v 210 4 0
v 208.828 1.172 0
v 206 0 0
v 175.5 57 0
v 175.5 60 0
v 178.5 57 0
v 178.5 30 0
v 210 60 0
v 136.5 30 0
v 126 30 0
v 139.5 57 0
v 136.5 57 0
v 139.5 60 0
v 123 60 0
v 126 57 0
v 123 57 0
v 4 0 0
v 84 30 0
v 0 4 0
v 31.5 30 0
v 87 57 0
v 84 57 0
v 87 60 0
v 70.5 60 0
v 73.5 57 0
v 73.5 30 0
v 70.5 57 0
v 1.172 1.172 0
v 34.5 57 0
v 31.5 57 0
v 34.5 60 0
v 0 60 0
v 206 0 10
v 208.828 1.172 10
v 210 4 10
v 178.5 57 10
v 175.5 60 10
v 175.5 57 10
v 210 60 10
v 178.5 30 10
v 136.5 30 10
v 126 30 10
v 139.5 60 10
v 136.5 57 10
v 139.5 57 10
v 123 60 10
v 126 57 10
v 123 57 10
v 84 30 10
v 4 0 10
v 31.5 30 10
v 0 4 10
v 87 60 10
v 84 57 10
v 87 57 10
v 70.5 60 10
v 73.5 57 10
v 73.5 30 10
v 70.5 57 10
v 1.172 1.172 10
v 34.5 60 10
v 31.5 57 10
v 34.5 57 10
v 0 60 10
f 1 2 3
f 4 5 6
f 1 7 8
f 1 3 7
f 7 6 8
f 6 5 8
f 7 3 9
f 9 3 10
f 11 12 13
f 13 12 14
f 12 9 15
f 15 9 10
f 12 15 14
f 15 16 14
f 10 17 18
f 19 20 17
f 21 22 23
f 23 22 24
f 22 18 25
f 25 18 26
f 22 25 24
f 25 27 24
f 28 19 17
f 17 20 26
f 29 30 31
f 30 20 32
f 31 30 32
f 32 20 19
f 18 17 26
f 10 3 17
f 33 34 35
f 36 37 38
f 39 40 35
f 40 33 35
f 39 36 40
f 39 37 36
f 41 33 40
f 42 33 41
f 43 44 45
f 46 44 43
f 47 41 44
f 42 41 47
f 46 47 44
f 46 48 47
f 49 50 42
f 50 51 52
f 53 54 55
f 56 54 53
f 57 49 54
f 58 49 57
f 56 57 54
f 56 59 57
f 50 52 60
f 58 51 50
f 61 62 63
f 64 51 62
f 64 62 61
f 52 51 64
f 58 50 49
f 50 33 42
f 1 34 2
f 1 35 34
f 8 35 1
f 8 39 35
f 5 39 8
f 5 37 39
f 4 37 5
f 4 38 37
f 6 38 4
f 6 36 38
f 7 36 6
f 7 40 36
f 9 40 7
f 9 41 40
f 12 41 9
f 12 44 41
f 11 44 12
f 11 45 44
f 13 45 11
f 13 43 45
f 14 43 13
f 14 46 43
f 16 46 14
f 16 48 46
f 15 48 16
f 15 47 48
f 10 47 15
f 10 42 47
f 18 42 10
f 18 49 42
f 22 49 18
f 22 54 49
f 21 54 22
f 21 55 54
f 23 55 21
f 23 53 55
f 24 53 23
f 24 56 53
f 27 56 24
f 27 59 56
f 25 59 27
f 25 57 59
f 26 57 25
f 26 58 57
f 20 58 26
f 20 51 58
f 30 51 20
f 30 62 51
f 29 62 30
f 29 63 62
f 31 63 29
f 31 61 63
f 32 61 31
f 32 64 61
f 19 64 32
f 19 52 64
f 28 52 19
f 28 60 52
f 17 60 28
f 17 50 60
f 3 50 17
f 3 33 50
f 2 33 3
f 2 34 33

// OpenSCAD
$fn = 32;

// ----------------------------------------------------------------------
// Oversize slot bar: 210 mm bar with 3 oversize windows
// ----------------------------------------------------------------------

// --- parameters (mm) ---
profile_height = 10;      // extrusion height
profile_points = 32;      // points of the closed outline

profile = [[0, 4], [1.172, 1.172], [4, 0], [206, 0], [208.828, 1.172], [210, 4], [210, 60], [175.5, 60], [175.5, 57], [178.5, 57], [178.5, 30], [136.5, 30], [136.5, 57], [139.5, 57], [139.5, 60], [123, 60], [123, 57], [126, 57], [126, 30], [84, 30], [84, 57], [87, 57], [87, 60], [70.5, 60], [70.5, 57], [73.5, 57], [73.5, 30], [31.5, 30], [31.5, 57], [34.5, 57], [34.5, 60], [0, 60]];  // single closed polygon, 32 points, counter clockwise

// --- the one profile operation ---
linear_extrude(height = profile_height) polygon(points = profile);
